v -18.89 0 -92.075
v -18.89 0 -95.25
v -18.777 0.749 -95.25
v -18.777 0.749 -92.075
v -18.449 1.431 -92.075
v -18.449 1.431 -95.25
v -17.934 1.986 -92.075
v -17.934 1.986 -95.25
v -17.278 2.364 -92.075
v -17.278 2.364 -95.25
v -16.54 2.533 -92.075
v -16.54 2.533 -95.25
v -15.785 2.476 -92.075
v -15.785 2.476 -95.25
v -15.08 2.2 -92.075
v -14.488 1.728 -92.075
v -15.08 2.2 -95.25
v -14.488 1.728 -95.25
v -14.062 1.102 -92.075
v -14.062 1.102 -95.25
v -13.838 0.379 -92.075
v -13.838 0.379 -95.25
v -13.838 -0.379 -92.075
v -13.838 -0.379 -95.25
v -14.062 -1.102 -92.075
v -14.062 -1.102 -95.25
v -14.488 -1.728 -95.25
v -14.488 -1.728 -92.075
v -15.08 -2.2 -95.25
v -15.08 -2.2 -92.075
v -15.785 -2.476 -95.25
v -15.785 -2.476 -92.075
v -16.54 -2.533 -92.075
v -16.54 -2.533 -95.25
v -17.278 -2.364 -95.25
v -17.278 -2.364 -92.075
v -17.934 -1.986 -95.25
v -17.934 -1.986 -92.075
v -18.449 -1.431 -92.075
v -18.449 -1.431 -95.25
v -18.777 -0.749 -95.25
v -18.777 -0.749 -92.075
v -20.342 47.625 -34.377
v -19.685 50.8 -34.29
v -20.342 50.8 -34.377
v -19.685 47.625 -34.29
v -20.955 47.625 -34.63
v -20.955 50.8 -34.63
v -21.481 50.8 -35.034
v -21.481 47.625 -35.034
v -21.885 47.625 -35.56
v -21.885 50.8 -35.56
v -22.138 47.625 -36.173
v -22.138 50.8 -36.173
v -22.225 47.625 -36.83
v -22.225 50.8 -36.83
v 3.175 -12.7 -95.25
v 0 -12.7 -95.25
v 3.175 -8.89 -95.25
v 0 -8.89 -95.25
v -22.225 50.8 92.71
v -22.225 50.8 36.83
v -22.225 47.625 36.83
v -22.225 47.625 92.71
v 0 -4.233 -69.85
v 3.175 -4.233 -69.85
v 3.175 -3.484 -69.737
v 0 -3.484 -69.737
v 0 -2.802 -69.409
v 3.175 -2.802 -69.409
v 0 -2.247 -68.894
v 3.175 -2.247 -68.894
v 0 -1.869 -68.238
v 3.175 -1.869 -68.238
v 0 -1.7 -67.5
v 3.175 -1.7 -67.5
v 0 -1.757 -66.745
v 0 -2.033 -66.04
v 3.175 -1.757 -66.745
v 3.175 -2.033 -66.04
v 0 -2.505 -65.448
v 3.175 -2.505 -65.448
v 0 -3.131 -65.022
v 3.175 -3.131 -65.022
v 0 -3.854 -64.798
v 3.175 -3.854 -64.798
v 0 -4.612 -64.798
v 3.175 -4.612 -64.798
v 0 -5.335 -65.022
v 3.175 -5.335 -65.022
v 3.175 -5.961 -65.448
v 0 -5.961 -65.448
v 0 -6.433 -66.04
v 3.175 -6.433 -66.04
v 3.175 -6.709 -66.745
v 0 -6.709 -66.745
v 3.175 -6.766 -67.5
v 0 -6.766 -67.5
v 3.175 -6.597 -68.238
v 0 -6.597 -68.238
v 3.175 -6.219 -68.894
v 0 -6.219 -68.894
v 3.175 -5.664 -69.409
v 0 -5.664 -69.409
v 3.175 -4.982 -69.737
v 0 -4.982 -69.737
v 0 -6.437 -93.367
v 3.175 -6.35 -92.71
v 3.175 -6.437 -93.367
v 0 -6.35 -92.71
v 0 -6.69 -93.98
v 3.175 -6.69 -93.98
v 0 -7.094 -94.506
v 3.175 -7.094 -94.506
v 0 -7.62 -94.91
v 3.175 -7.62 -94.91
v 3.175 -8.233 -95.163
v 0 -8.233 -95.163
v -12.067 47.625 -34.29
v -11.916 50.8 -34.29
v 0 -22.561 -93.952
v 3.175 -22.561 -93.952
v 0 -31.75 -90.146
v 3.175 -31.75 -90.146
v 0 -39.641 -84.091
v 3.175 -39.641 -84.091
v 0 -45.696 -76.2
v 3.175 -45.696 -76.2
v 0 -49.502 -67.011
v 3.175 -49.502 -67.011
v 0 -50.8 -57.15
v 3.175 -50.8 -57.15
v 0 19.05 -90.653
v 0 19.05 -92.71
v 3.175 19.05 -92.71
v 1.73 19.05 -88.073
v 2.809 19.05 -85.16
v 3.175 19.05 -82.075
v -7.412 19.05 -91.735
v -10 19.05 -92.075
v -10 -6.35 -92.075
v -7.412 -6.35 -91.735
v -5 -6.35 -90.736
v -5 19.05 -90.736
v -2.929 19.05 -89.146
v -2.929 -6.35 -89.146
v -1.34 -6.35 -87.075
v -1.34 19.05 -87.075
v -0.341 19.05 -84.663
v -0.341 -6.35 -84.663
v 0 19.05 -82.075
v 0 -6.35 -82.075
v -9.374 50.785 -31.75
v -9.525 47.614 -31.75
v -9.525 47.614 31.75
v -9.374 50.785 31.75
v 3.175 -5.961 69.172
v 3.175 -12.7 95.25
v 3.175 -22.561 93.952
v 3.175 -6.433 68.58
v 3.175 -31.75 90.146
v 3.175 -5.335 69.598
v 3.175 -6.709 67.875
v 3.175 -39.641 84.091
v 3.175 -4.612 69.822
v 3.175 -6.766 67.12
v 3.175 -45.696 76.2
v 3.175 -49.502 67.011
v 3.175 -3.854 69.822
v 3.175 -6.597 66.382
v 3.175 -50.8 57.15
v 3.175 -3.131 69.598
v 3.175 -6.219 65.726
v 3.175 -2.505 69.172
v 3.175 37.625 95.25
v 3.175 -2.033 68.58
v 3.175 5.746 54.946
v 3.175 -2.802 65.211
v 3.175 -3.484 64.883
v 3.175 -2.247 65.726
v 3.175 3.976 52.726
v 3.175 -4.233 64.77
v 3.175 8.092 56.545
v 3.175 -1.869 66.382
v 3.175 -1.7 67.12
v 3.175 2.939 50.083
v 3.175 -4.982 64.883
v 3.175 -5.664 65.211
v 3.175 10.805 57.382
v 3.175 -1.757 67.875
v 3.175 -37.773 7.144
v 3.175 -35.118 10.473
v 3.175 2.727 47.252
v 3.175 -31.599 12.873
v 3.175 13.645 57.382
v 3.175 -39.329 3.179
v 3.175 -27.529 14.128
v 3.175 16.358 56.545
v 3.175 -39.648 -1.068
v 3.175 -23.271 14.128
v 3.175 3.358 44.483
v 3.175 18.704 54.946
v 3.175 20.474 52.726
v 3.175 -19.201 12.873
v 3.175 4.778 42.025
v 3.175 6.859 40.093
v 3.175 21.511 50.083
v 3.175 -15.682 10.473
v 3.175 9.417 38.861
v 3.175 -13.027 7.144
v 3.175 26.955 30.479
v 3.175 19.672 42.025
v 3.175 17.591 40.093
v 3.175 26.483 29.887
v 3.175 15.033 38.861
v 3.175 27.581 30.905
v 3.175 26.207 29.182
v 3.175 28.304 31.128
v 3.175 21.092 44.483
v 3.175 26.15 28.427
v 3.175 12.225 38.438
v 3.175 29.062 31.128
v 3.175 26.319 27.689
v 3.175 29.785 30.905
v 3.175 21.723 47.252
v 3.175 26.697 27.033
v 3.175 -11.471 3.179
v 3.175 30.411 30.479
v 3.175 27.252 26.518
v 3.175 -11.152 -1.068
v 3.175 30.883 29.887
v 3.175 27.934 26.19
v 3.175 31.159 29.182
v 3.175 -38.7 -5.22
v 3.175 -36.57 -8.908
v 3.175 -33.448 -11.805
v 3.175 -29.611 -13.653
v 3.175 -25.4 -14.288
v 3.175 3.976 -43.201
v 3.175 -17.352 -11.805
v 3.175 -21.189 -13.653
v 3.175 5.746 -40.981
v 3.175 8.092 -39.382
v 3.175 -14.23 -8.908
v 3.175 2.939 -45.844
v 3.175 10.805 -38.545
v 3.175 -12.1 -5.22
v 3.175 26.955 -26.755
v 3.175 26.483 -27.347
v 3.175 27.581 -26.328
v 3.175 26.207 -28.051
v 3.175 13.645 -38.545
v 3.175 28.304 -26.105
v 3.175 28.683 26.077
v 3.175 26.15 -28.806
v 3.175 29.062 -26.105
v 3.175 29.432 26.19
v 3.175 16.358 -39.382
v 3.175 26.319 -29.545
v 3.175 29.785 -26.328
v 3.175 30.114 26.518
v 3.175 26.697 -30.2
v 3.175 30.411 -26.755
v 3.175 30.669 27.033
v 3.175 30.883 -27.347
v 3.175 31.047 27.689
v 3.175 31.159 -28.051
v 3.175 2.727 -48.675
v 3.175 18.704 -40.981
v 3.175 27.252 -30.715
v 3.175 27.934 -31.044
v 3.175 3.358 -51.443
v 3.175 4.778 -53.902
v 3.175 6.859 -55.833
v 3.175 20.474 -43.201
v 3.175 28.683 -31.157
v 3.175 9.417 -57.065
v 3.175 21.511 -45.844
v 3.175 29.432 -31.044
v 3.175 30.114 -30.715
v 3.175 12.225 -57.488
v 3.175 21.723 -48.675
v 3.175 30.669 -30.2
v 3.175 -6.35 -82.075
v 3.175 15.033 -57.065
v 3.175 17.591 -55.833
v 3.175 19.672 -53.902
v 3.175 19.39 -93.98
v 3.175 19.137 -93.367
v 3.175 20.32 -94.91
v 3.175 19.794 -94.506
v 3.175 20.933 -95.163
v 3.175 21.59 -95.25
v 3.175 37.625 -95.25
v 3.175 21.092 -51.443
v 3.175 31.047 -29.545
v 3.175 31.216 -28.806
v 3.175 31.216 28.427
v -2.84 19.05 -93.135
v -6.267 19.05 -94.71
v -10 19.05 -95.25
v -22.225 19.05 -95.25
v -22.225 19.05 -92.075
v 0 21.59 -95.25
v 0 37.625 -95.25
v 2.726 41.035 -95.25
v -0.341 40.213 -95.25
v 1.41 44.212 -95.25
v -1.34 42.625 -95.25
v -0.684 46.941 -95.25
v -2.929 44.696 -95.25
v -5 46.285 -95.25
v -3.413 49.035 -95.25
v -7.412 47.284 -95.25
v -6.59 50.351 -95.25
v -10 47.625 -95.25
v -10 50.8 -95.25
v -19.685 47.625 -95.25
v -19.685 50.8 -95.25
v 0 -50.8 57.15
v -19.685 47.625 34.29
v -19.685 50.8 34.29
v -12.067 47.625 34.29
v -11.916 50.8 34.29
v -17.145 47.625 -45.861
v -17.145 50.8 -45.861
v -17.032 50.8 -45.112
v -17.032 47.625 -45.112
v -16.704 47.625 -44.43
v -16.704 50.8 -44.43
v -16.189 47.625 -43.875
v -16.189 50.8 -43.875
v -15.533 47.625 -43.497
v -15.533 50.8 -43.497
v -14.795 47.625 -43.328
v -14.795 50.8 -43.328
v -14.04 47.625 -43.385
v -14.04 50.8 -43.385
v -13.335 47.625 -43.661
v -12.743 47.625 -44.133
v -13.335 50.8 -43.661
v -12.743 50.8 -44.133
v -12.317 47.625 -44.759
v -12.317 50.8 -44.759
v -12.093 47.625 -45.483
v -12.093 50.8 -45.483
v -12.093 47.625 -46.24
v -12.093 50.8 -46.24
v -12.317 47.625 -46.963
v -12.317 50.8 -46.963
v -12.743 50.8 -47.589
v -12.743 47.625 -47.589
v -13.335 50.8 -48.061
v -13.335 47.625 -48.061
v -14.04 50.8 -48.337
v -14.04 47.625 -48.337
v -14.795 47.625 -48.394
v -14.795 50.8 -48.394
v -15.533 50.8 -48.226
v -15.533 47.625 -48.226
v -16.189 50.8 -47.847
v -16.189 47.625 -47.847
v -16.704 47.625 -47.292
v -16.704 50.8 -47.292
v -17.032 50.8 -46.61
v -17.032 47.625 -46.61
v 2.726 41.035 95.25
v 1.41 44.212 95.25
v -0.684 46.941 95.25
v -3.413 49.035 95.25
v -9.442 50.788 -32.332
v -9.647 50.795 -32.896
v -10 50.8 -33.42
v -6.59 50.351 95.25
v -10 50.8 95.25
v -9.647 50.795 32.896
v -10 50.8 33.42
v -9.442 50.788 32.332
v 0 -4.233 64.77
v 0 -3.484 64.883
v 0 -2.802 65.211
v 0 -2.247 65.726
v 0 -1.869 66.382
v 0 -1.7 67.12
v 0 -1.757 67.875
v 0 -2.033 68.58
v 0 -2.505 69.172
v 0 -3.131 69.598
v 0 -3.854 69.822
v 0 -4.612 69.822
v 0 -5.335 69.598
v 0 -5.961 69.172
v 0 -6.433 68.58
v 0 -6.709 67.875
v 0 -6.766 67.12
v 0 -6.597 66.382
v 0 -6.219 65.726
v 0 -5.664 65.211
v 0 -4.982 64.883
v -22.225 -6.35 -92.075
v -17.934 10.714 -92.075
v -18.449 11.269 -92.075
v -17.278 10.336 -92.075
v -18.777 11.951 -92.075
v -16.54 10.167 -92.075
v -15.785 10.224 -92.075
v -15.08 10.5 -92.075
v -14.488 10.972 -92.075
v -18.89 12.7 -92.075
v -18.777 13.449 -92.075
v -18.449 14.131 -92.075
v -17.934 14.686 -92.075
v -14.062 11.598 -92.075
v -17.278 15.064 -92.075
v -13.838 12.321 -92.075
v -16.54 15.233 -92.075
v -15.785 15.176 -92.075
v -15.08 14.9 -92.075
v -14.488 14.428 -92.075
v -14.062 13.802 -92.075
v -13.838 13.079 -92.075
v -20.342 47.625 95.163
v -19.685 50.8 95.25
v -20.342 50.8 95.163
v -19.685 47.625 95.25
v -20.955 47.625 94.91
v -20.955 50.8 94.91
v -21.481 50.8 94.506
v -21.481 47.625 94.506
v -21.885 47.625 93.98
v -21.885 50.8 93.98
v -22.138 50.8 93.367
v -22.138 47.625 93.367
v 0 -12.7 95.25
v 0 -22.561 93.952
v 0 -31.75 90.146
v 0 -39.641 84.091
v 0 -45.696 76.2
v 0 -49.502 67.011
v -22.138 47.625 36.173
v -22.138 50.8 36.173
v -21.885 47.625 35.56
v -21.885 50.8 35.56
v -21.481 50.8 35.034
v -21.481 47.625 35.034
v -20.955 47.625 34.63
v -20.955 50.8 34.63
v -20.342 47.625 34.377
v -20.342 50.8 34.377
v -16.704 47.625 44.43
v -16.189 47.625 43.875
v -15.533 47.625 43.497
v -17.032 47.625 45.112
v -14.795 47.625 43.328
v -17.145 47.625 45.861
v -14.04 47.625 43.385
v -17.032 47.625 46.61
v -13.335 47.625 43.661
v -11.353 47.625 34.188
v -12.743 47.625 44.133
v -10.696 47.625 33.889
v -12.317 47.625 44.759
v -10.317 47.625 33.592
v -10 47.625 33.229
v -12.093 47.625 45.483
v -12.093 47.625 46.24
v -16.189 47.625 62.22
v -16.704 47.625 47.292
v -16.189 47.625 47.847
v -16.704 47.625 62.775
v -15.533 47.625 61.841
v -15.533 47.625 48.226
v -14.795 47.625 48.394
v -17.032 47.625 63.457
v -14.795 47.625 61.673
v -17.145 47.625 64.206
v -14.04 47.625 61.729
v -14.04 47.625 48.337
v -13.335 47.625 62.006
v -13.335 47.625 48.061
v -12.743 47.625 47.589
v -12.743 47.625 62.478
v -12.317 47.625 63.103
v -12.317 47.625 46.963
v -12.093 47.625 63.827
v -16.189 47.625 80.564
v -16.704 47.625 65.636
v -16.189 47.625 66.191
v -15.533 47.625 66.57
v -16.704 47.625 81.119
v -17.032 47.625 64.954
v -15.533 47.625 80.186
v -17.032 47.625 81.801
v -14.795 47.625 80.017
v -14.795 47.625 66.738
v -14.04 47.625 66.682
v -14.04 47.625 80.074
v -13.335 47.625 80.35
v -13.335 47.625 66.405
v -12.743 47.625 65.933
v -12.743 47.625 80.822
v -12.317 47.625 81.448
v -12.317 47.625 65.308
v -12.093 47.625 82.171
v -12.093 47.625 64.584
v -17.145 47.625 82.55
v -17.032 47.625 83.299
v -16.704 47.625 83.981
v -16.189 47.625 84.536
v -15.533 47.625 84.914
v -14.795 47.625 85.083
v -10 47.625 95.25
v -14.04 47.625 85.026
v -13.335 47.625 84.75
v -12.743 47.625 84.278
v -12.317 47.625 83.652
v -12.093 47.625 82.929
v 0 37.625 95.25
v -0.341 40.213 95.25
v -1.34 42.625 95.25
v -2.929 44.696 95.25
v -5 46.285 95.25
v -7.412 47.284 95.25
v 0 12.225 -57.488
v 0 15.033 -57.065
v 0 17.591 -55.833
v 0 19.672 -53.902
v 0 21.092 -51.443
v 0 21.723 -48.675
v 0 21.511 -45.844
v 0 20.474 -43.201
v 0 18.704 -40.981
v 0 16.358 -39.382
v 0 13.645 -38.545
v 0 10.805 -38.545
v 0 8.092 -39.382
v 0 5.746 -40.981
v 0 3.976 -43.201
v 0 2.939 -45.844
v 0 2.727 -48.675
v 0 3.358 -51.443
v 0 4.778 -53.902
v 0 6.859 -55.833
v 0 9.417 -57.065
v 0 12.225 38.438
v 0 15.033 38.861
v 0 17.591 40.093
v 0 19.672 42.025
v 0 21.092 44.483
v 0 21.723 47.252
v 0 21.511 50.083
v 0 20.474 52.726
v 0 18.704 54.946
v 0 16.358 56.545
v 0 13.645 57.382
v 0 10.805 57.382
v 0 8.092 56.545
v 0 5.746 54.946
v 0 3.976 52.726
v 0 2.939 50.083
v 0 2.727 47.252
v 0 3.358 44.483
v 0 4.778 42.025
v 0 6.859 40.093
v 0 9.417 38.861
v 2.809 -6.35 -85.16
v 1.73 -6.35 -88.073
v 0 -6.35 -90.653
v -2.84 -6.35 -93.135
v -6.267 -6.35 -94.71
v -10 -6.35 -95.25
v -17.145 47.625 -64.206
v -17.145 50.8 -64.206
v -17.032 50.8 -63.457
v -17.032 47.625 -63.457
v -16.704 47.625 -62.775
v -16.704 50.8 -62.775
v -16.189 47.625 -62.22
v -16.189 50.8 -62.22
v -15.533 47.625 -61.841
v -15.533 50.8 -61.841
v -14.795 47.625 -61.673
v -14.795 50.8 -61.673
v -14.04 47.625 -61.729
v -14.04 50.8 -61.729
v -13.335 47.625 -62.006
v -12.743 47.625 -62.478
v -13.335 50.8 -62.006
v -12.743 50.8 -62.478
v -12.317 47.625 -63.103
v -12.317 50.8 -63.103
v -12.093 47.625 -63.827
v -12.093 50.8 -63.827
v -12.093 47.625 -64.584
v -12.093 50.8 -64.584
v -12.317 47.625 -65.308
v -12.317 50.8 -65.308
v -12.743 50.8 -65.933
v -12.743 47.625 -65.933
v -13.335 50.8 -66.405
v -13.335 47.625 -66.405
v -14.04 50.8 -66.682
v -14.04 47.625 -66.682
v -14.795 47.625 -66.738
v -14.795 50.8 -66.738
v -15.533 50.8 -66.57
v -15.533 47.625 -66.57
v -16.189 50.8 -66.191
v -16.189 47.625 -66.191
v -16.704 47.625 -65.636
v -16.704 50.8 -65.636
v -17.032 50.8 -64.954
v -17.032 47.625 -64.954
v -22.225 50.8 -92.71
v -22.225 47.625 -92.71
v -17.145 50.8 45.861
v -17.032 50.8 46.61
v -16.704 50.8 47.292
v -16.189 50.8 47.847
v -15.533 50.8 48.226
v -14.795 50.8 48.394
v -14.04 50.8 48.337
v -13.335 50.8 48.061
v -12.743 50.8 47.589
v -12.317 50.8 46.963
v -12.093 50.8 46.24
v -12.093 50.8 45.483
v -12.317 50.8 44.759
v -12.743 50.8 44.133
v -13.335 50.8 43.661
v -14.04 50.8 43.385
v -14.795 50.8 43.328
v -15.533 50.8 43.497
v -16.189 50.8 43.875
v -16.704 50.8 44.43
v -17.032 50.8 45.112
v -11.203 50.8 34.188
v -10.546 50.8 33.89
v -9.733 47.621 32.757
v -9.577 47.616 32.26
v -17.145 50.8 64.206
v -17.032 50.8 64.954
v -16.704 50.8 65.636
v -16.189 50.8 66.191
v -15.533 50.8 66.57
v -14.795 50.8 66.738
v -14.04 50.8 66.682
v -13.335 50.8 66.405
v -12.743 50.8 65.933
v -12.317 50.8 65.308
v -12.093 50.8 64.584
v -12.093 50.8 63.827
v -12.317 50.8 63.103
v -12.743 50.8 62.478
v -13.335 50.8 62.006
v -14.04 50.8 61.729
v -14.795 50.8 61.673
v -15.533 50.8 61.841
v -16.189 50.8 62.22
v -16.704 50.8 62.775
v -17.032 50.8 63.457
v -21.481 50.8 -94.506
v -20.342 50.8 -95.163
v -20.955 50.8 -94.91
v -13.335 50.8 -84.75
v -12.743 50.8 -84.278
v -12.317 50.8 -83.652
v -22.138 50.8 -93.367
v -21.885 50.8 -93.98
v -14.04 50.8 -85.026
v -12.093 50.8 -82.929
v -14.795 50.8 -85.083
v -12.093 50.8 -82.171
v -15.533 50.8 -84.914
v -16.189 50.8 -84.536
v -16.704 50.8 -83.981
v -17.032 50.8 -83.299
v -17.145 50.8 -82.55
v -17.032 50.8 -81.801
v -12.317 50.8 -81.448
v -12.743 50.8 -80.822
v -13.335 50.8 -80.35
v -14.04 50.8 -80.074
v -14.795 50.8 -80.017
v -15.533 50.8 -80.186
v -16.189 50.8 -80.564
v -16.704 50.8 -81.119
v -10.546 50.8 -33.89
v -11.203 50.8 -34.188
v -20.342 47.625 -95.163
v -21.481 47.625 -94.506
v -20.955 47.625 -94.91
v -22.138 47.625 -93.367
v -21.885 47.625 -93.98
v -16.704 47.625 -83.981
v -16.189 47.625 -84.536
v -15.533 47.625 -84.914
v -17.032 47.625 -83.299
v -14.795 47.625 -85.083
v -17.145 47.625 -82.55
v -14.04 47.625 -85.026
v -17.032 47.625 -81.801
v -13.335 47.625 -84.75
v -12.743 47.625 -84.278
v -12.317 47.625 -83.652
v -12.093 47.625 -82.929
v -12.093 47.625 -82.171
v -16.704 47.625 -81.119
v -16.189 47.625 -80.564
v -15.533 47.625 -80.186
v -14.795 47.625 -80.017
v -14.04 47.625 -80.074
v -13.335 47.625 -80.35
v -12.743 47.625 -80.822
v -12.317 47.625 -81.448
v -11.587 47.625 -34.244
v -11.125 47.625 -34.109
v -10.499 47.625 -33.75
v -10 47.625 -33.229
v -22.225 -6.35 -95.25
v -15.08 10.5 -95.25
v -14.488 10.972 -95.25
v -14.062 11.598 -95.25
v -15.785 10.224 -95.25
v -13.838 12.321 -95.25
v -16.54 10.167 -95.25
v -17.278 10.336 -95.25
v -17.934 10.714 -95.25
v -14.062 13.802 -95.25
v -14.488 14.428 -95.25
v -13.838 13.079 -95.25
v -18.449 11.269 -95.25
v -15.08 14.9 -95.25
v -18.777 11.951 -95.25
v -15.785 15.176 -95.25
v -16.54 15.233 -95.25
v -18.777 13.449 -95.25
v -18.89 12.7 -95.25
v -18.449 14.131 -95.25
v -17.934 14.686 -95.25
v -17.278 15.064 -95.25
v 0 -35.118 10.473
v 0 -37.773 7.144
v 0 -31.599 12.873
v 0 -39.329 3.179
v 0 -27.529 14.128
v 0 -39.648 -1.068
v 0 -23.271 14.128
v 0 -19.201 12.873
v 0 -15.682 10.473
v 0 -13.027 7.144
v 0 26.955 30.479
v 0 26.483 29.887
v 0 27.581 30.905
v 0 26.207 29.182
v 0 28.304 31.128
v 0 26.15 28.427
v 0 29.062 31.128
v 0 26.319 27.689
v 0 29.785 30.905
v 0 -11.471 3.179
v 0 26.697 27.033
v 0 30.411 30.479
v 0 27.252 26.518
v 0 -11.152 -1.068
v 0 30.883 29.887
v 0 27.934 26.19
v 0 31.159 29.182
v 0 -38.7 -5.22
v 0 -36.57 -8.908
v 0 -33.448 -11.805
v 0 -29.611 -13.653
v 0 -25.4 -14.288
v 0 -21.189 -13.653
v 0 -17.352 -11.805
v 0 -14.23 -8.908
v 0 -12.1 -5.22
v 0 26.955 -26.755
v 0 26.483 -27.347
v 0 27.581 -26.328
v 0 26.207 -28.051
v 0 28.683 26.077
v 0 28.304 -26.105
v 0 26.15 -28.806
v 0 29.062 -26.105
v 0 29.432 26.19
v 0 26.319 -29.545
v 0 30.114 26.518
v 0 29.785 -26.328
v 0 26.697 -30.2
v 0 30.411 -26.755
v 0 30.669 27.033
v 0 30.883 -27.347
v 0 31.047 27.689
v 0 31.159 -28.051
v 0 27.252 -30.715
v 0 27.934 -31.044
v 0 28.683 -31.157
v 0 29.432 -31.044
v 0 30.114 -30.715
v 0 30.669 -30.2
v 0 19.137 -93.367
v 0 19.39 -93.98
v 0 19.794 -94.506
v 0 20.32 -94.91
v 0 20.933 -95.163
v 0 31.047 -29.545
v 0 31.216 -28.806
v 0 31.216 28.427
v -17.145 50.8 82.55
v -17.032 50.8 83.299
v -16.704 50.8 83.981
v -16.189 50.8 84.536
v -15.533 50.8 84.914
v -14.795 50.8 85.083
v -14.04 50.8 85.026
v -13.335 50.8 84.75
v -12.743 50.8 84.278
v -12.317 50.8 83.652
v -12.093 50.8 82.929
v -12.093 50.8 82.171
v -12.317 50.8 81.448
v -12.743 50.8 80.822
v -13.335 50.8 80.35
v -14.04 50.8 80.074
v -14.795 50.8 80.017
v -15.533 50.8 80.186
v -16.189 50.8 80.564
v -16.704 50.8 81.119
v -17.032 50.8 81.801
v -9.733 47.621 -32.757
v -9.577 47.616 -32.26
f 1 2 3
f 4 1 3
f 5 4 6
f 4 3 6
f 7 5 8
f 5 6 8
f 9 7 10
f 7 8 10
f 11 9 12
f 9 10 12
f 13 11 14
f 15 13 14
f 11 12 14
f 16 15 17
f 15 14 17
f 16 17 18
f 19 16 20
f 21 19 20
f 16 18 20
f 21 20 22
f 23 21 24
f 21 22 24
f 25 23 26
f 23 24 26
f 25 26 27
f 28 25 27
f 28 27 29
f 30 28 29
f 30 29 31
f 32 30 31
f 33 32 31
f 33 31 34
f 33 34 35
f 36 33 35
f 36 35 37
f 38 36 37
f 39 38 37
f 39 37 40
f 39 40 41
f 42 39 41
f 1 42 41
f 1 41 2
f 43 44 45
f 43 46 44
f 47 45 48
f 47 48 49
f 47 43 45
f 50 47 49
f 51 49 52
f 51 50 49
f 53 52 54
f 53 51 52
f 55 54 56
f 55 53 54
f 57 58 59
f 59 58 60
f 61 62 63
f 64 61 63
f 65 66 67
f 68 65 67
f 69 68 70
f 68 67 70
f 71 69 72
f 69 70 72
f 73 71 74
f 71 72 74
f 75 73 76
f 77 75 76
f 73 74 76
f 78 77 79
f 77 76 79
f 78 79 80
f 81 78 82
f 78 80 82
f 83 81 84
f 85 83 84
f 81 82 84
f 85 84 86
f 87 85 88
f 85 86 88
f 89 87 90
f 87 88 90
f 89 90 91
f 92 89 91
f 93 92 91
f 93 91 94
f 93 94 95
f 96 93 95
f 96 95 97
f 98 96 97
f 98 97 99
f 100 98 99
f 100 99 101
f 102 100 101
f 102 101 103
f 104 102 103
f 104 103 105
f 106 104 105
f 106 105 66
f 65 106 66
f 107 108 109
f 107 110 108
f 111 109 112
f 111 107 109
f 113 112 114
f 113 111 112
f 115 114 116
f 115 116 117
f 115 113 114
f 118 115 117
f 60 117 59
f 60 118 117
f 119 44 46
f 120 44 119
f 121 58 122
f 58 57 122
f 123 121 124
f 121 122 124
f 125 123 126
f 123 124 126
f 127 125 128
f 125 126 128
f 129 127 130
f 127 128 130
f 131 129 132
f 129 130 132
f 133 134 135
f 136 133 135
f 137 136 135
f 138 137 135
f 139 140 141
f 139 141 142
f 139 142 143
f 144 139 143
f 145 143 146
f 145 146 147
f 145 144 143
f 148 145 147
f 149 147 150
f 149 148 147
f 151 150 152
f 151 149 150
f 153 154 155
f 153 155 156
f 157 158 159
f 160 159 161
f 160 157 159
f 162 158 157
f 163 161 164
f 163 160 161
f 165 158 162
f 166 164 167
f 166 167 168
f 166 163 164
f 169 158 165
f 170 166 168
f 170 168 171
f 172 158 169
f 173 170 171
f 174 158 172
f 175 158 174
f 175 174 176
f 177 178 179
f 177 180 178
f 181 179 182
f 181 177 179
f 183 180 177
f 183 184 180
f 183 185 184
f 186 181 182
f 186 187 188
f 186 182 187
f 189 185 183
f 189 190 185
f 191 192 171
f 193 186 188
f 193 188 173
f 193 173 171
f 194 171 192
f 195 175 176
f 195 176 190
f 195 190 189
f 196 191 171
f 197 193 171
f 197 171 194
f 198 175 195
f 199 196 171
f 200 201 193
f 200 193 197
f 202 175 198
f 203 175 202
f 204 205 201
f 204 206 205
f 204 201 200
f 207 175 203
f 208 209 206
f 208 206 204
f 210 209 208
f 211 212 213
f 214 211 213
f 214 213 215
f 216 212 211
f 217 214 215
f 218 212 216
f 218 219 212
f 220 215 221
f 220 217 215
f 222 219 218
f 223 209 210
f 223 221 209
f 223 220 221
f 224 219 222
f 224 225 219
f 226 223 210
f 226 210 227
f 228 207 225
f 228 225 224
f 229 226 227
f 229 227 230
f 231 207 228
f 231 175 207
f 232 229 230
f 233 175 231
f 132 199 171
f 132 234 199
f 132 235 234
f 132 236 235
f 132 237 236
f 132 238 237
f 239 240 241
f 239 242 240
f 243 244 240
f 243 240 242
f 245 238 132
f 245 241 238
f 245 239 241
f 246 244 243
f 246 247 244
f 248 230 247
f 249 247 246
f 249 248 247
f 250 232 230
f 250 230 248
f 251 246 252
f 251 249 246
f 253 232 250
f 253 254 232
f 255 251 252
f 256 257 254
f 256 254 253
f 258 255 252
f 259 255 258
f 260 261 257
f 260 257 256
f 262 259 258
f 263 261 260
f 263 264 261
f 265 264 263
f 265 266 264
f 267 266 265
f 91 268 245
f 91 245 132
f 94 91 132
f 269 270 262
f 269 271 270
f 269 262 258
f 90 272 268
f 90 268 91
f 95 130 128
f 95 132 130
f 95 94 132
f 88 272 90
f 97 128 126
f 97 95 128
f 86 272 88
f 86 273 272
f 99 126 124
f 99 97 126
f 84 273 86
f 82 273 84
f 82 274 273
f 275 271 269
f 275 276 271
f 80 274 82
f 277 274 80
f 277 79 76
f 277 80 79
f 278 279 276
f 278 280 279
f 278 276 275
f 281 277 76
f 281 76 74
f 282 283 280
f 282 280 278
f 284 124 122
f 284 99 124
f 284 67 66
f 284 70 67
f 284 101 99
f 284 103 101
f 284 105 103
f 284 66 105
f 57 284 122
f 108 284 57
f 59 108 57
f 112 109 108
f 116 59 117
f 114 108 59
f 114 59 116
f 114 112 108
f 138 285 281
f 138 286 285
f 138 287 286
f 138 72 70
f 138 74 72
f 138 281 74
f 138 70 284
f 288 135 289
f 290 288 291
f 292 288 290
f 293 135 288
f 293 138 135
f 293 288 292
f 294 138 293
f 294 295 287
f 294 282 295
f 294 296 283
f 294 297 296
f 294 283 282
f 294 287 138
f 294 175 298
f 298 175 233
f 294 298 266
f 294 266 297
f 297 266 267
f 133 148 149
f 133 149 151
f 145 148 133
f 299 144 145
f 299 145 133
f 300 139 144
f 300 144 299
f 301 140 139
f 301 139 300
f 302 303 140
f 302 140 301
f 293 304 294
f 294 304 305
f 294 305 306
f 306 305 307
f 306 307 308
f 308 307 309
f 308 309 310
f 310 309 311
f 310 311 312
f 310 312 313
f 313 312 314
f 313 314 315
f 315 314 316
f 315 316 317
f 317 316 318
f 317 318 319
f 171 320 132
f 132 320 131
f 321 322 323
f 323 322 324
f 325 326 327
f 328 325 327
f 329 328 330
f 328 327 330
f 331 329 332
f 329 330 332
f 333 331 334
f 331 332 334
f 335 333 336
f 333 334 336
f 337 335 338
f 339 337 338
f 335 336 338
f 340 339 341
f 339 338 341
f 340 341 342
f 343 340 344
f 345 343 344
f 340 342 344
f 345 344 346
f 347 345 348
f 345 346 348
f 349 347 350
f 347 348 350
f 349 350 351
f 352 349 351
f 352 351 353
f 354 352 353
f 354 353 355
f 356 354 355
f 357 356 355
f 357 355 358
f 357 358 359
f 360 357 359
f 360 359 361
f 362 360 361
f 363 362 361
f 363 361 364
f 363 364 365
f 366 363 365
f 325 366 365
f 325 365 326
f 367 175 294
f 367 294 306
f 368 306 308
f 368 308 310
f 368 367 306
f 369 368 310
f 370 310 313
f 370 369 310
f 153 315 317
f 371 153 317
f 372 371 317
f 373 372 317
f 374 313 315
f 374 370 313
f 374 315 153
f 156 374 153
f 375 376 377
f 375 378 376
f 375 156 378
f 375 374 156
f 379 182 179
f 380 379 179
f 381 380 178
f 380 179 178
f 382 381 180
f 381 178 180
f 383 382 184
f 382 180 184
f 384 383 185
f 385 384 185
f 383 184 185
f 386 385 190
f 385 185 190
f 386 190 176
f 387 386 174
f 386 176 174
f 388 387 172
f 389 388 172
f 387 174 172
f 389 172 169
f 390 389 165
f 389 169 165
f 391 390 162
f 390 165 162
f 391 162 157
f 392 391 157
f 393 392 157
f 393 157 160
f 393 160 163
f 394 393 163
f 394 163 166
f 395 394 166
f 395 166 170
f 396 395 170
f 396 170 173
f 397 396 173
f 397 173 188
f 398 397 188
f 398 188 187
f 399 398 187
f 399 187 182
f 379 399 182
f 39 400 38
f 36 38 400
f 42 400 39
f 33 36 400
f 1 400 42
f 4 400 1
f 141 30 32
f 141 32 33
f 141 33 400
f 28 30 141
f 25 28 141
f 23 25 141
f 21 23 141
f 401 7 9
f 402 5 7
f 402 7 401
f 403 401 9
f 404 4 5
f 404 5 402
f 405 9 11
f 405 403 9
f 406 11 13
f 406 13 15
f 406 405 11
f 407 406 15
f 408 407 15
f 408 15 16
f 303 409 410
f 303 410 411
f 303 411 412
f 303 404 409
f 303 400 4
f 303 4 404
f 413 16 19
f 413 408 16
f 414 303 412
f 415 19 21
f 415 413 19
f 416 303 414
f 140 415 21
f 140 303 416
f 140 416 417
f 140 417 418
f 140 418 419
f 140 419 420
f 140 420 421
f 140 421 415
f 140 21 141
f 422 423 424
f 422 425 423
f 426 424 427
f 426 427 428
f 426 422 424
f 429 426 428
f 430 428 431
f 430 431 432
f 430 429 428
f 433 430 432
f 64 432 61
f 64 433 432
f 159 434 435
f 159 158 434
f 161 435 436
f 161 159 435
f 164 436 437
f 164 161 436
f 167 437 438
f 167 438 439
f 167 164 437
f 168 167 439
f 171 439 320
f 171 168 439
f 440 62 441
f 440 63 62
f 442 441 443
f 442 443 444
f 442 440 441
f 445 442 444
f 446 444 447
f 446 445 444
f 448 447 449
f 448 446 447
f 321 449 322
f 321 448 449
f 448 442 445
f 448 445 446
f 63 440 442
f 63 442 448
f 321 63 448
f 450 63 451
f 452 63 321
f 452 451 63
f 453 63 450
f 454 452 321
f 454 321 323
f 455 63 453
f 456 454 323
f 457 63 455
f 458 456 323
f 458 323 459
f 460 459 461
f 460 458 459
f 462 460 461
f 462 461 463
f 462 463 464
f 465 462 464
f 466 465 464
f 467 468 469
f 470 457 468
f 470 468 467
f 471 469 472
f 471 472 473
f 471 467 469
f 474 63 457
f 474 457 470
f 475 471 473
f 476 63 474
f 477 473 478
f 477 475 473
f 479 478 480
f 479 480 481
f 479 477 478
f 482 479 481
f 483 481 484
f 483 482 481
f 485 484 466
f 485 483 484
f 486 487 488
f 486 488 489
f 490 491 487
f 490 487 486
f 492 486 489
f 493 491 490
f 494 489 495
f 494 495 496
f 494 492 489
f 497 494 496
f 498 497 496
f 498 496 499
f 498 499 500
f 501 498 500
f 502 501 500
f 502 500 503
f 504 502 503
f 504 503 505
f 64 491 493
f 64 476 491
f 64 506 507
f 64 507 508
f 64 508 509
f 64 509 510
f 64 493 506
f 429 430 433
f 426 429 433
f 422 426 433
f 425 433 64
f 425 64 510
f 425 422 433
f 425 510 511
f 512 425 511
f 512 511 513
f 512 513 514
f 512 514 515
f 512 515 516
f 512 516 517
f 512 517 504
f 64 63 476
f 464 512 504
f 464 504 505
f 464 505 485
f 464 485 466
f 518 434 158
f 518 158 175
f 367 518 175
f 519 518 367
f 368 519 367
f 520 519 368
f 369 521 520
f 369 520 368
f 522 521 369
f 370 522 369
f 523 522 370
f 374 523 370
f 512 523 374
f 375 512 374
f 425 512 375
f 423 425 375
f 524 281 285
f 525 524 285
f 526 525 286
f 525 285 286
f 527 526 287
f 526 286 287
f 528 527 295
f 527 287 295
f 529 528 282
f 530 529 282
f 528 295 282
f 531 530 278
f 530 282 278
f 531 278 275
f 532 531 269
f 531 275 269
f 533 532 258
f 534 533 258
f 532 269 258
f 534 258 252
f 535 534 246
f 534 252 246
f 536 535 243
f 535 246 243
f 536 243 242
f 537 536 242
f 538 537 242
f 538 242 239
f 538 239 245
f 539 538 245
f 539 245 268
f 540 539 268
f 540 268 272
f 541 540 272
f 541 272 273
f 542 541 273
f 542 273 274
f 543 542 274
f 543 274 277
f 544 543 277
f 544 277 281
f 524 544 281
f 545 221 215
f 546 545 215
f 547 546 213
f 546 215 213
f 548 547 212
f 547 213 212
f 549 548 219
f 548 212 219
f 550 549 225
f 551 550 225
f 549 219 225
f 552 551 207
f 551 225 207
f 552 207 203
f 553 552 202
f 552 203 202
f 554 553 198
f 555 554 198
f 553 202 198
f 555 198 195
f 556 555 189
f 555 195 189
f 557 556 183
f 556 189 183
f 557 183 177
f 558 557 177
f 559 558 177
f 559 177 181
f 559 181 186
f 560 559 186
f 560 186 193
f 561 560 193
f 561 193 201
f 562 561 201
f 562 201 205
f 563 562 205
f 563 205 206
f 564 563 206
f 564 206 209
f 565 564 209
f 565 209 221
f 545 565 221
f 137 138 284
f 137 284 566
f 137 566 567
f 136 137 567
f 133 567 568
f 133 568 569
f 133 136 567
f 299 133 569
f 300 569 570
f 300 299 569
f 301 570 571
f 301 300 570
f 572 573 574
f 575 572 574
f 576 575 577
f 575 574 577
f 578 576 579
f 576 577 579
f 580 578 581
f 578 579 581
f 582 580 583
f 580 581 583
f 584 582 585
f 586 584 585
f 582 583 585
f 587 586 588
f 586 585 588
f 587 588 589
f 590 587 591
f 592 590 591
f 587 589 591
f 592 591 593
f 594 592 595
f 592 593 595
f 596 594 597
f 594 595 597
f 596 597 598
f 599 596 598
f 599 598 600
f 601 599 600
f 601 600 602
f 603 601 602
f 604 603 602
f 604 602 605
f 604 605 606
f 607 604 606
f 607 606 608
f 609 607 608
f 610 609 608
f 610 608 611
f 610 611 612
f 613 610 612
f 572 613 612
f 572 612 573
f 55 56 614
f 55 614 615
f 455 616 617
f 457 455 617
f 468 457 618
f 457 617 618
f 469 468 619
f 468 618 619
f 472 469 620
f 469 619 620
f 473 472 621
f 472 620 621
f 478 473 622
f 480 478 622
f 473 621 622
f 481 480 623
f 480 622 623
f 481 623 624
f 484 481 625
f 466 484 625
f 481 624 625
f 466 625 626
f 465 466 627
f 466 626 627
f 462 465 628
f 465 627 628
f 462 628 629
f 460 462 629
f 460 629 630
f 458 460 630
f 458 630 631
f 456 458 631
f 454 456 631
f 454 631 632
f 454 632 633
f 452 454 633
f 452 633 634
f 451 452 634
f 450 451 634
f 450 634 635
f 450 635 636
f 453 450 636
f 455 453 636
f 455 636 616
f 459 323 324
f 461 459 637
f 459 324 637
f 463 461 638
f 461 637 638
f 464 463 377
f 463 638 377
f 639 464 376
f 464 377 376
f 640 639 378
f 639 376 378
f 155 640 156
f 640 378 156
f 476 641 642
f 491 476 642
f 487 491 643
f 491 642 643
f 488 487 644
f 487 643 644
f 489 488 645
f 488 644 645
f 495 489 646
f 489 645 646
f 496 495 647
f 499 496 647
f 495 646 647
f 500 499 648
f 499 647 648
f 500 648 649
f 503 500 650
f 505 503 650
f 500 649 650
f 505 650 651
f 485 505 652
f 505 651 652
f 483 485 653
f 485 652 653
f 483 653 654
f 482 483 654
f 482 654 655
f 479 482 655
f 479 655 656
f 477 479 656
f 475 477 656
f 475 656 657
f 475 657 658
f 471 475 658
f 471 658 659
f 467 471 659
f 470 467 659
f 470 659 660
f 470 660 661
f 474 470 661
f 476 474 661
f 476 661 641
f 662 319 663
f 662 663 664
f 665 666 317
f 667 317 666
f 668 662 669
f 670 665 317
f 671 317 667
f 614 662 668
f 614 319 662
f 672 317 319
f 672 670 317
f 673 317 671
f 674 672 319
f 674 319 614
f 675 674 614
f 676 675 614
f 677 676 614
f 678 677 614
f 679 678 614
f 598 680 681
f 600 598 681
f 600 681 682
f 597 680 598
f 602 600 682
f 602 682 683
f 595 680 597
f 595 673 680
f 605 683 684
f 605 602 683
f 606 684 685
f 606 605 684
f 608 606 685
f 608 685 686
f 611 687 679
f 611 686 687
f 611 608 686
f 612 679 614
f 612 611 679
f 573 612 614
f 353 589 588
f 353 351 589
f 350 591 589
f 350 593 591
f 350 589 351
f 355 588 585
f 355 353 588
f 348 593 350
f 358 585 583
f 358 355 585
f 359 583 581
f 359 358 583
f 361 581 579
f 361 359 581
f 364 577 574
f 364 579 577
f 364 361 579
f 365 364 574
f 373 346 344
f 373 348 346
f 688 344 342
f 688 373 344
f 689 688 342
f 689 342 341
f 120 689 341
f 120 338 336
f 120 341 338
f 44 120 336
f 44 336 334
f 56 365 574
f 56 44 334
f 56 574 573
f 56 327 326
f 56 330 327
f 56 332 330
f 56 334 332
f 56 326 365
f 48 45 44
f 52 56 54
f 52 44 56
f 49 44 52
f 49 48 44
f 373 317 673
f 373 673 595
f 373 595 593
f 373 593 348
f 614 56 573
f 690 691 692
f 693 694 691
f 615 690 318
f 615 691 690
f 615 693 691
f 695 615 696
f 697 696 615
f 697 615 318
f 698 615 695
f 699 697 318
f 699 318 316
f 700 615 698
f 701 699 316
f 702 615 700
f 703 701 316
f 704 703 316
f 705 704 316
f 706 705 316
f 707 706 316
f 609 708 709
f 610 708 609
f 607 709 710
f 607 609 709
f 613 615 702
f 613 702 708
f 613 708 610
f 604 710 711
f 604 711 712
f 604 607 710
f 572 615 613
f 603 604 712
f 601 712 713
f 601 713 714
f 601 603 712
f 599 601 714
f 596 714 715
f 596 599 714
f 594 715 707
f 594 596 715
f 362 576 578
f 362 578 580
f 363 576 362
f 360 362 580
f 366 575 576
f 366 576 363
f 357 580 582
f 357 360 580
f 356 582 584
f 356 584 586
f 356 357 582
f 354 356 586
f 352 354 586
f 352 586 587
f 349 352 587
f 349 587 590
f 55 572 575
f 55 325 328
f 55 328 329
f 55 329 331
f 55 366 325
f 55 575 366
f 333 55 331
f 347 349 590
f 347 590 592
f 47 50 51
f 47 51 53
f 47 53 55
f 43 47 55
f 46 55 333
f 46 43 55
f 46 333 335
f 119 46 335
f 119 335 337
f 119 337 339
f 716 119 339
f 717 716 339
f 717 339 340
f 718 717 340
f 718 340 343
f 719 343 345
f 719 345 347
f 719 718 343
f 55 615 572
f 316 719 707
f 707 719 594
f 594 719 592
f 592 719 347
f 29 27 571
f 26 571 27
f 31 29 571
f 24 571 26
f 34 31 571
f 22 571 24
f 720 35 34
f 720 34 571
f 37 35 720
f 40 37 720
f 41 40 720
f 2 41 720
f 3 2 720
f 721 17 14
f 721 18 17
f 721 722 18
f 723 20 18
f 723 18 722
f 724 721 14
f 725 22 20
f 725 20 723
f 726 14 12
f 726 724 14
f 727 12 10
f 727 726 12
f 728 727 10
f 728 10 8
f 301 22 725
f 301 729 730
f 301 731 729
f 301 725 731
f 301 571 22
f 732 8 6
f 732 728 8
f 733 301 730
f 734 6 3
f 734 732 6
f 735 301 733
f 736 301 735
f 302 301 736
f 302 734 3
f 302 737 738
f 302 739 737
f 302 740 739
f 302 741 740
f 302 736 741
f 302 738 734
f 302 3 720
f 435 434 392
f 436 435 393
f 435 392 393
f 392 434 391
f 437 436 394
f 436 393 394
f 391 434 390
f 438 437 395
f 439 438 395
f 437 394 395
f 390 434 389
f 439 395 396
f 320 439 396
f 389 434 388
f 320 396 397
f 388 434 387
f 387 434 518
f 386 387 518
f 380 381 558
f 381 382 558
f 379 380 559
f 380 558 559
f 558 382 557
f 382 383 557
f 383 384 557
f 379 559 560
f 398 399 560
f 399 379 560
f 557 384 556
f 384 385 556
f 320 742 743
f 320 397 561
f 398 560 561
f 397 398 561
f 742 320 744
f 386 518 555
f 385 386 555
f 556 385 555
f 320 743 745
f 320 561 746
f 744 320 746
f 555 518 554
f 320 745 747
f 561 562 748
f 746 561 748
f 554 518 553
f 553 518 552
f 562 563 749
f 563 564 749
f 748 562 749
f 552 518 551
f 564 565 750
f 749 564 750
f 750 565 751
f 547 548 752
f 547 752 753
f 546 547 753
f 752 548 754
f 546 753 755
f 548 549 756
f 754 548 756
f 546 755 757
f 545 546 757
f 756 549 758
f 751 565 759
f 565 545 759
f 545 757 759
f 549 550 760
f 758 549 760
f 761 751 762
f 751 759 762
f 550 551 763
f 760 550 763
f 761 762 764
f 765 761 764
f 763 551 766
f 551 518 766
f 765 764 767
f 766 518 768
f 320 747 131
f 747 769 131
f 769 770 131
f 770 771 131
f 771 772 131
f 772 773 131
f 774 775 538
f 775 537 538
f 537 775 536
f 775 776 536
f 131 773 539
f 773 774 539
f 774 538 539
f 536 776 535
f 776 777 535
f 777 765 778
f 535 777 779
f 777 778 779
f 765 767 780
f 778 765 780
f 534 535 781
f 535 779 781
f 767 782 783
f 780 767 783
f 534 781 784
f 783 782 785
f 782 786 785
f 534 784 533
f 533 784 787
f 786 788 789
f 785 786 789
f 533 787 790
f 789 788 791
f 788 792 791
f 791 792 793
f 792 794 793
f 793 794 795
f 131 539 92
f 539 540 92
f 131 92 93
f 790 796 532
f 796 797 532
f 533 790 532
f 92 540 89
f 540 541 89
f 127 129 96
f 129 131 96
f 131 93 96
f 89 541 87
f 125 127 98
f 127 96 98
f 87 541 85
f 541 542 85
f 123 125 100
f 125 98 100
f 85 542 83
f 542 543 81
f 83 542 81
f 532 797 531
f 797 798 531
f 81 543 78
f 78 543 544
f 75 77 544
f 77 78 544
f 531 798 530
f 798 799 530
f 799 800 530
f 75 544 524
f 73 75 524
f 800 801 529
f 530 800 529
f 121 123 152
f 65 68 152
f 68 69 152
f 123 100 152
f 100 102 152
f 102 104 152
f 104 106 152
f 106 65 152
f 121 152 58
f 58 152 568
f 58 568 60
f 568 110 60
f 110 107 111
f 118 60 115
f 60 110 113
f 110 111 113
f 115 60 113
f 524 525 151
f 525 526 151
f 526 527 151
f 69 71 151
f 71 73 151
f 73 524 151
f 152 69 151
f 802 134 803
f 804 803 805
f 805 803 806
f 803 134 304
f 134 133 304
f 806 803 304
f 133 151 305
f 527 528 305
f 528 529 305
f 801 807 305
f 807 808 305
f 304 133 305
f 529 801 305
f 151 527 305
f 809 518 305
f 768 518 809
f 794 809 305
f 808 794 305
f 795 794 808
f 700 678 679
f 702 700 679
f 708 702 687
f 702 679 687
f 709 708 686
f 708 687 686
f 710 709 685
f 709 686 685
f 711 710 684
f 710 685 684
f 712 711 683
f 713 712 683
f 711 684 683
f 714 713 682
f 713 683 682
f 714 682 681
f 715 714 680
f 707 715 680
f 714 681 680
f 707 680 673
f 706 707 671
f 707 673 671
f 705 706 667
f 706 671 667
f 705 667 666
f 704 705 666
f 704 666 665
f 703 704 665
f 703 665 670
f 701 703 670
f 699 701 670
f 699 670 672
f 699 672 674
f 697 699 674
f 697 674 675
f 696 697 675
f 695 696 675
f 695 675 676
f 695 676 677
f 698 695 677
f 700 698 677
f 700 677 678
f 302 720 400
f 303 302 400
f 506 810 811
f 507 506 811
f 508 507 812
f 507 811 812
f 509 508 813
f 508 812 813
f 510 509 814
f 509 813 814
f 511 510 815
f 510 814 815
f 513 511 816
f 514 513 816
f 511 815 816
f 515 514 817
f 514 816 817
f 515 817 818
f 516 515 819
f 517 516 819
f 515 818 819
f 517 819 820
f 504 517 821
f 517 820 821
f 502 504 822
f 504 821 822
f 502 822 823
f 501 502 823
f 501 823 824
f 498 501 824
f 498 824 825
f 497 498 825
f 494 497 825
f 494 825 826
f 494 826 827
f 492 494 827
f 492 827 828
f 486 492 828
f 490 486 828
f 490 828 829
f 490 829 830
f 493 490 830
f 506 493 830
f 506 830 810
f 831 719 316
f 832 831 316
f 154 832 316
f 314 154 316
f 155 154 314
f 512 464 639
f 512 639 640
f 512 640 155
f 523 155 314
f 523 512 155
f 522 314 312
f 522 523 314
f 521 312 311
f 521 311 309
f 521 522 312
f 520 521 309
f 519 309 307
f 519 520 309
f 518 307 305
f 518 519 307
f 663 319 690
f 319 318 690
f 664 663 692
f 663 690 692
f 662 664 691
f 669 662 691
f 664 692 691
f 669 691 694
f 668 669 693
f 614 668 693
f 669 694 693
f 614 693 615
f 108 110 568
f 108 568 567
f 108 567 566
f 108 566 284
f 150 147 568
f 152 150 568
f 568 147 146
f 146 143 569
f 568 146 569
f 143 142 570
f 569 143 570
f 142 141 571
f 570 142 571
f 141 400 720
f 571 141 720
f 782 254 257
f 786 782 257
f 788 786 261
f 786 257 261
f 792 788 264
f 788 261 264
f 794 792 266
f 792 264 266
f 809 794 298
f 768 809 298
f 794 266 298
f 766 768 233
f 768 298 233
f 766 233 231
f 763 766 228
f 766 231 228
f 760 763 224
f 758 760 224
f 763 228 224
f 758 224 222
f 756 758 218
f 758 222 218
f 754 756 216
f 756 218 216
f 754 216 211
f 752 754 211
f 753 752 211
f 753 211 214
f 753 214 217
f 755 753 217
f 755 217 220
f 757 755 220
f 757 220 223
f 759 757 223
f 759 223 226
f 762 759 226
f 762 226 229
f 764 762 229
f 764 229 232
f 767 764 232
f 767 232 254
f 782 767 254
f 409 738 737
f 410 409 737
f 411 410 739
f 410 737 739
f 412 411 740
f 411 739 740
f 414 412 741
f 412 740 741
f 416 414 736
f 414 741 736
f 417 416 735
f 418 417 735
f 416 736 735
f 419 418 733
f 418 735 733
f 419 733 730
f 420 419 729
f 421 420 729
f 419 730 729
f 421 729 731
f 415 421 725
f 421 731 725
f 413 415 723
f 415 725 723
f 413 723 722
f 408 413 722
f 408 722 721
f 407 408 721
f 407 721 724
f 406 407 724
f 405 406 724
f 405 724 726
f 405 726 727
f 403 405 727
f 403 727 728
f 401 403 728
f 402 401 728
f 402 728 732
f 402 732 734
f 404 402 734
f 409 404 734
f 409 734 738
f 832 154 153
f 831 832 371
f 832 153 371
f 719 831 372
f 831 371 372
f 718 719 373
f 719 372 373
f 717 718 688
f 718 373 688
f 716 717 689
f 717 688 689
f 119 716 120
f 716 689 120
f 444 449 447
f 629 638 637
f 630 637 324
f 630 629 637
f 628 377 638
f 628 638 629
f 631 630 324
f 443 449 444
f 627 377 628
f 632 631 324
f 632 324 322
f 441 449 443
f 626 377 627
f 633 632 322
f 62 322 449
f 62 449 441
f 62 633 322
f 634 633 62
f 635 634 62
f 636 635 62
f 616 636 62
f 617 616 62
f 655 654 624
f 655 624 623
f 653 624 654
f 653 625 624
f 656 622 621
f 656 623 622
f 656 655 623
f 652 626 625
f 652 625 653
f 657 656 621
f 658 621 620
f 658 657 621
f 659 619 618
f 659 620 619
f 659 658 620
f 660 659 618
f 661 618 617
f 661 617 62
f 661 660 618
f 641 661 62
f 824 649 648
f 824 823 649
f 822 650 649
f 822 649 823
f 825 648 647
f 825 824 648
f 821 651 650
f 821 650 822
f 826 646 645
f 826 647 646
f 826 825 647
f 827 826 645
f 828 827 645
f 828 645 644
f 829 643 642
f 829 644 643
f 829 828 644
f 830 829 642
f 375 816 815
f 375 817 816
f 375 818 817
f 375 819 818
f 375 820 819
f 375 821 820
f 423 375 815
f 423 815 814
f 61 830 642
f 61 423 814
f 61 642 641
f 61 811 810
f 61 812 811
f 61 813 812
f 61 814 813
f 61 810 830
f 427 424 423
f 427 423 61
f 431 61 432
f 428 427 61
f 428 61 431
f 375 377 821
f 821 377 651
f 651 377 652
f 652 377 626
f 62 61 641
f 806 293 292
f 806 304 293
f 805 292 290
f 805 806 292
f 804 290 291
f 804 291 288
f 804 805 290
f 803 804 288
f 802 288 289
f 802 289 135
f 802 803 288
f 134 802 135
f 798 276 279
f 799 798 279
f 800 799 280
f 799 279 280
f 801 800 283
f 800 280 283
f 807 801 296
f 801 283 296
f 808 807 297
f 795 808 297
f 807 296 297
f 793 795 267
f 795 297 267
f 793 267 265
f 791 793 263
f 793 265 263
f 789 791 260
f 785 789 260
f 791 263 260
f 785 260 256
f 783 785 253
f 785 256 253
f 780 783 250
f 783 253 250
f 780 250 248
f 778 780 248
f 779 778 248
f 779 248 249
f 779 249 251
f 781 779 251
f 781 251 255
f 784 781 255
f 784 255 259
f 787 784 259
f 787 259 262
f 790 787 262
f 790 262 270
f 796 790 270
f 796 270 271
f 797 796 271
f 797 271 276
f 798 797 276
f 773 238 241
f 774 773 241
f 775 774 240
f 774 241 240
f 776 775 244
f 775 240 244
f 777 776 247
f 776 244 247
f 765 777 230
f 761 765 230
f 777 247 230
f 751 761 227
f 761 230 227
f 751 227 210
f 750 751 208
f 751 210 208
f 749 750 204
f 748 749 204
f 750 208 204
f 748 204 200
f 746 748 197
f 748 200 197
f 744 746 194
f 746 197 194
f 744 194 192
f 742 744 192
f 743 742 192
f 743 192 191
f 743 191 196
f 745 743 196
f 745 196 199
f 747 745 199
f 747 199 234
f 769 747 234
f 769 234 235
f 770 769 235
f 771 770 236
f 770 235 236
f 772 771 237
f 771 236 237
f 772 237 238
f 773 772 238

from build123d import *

# Parameters (mm, degrees)
SKETCH1_W                    = 190.5
SKETCH1_H                    = 101.6
BOSS_EXTRUDE1_DEPTH          = 3.175
SKETCH2_R                    = 14.2875
CUT_EXTRUDE1_DEPTH           = 3.175
EDGE_FLANGE1_STRIP_W         = 32.7
EDGE_FLANGE1_STRIP_H         = 3.175
EDGE_FLANGE1_STRIP_CUT_DEPTH = 190.5
EDGE_FLANGE1_DEPTH           = 190.5
SKETCH12_R                   = 9.525
SKETCH12_R_2                 = 2.54
CUT_EXTRUDE2_DEPTH           = 7.62
FILLET1_R                    = 38.1
SKETCH13_W                   = 3.175
SKETCH13_H                   = 25.4
BOSS_EXTRUDE2_DEPTH          = 0.000254
EDGE_FLANGE2_STRIP_W         = 32.7
EDGE_FLANGE2_STRIP_H         = 3.175
EDGE_FLANGE2_STRIP_CUT_DEPTH = 25.4
EDGE_FLANGE2_DEPTH           = 25.4
SKETCH17_R                   = 2.54
CUT_EXTRUDE3_DEPTH           = 142.028796748
SKETCH18_R                   = 2.54
CUT_EXTRUDE4_DEPTH           = 199.405991339
CUT_EXTRUDE5_START           = -34.29
CUT_EXTRUDE5_DEPTH           = 68.58
FILLET3_R                    = 2.54
FILLET4_R                    = 2.54


# Read off the part's stored shape, not the designer's step: Cut-Extrude5
# Sheet-metal steps are written as plain solids
with BuildPart() as part:
    # Sketch1 → Boss-Extrude1 (new body)
    with BuildSketch(Plane(origin=(0, 0, 0), x_dir=(0, 0, -1), z_dir=(1, 0, 0))):
        Rectangle(SKETCH1_W, SKETCH1_H)
    extrude(amount=BOSS_EXTRUDE1_DEPTH)

    # Sketch2 → Cut-Extrude1 (cut)
    with BuildSketch(Plane(origin=(3.175, 0, 0), x_dir=(0, 0, -1), z_dir=(1, 0, 0))):
        with Locations((0, -25.4)):
            Circle(SKETCH2_R)
    extrude(amount=-CUT_EXTRUDE1_DEPTH, mode=Mode.SUBTRACT)

    # Edge-Flange1 strip (across the edge) → Edge-Flange1 strip cut (cut)
    with BuildSketch(Plane(origin=(0, 50.8, 95.25), x_dir=(0, -1, 0), z_dir=(0, 0, -1))):
        with Locations((-3.175, -1.5875)):
            Rectangle(EDGE_FLANGE1_STRIP_W, EDGE_FLANGE1_STRIP_H)
    extrude(amount=EDGE_FLANGE1_STRIP_CUT_DEPTH, mode=Mode.SUBTRACT)

    # Edge-Flange1 section (across the edge) → Edge-Flange1 (add)
    with BuildSketch(Plane(origin=(0, 50.8, 95.25), x_dir=(0, -1, 0), z_dir=(0, 0, -1))):
        with BuildLine():
            Line((0, 10), (0, 22.225))
            Line((0, 22.225), (3.175, 22.225))
            Line((3.175, 22.225), (3.175, 10))
            ThreePointArc((3.175, 10), (6.103932188, 2.928932188), (13.175, 0))
            Line((13.175, 0), (13.175, -3.175))
            ThreePointArc((13.175, -3.175), (3.858868158, 0.683868158), (0, 10))
        make_face()
    extrude(amount=EDGE_FLANGE1_DEPTH)

    # Sketch12 → Cut-Extrude2 (cut)
    with BuildSketch(Plane(origin=(3.175, 0, 0), x_dir=(0, 0, -1), z_dir=(1, 0, 0))):
        with Locations((-47.963329482, 12.225)):
            Circle(SKETCH12_R)
        with Locations((-28.616658964, 28.683017495)):
            Circle(SKETCH12_R_2)
        with Locations((-67.31, -4.233017495)):
            Circle(SKETCH12_R_2)
        with Locations((47.963329482, 12.225)):
            Circle(SKETCH12_R)
        with Locations((28.616658964, 28.683017495)):
            Circle(SKETCH12_R_2)
        with Locations((67.31, -4.233017495)):
            Circle(SKETCH12_R_2)
    extrude(amount=-CUT_EXTRUDE2_DEPTH, mode=Mode.SUBTRACT)

    # Fillet1
    fillet1_edges = [part.edges().sort_by_distance(p)[0] for p in [
        (1.5875, -50.8, 95.25),
        (1.5875, -50.8, -95.25),
    ]]
    fillet(fillet1_edges, radius=FILLET1_R)

    # Sketch13 → Boss-Extrude2 (add)
    with BuildSketch(Plane(origin=(0, 0, -95.25), x_dir=(-1, 0, 0), z_dir=(0, 0, -1))):
        with Locations((-1.5875, 6.35)):
            Rectangle(SKETCH13_W, SKETCH13_H)
    extrude(amount=BOSS_EXTRUDE2_DEPTH)

    # Edge-Flange2 strip (across the edge) → Edge-Flange2 strip cut (cut)
    with BuildSketch(Plane(origin=(0, 19.05, -95.250254), x_dir=(0, 0, 1), z_dir=(0, -1, 0))):
        with Locations((-3.175, -1.5875)):
            Rectangle(EDGE_FLANGE2_STRIP_W, EDGE_FLANGE2_STRIP_H)
    extrude(amount=EDGE_FLANGE2_STRIP_CUT_DEPTH, mode=Mode.SUBTRACT)

    # Edge-Flange2 section (across the edge) → Edge-Flange2 (add)
    with BuildSketch(Plane(origin=(0, 19.05, -95.250254), x_dir=(0, 0, 1), z_dir=(0, -1, 0))):
        with BuildLine():
            Line((0, 10), (0, 22.225))
            Line((0, 22.225), (3.175, 22.225))
            Line((3.175, 22.225), (3.175, 10))
            ThreePointArc((3.175, 10), (6.103932188, 2.928932188), (13.175, 0))
            Line((13.175, 0), (13.175, -3.175))
            ThreePointArc((13.175, -3.175), (3.858868158, 0.683868158), (0, 10))
        make_face()
    extrude(amount=EDGE_FLANGE2_DEPTH)

    # Sketch17 → Cut-Extrude3 (cut, through all)
    with BuildSketch(Plane(origin=(0, 50.8, 0), x_dir=(1, 0, 0), z_dir=(0, 1, 0))):
        with Locations(Location((-14.605, 82.55, 0), (0, 0, 180))):
            Circle(SKETCH17_R)
        with Locations(Location((-14.605, 64.205555556, 0), (0, 0, 180))):
            Circle(SKETCH17_R)
        with Locations(Location((-14.605, 45.861111111, 0), (0, 0, 180))):
            Circle(SKETCH17_R)
        with Locations(Location((-14.605, 27.516666667, 0), (0, 0, 180))):
            Circle(SKETCH17_R)
        with Locations(Location((-14.605, 9.172222222, 0), (0, 0, 180))):
            Circle(SKETCH17_R)
        with Locations(Location((-14.605, -9.172222222, 0), (0, 0, 180))):
            Circle(SKETCH17_R)
        with Locations(Location((-14.605, -27.516666667, 0), (0, 0, 180))):
            Circle(SKETCH17_R)
        with Locations(Location((-14.605, -45.861111111, 0), (0, 0, 180))):
            Circle(SKETCH17_R)
        with Locations(Location((-14.605, -64.205555556, 0), (0, 0, 180))):
            Circle(SKETCH17_R)
        with Locations(Location((-14.605, -82.55, 0), (0, 0, 180))):
            Circle(SKETCH17_R)
    extrude(amount=-CUT_EXTRUDE3_DEPTH, mode=Mode.SUBTRACT)

    # Sketch18 → Cut-Extrude4 (cut, through all)
    with BuildSketch(Plane(origin=(0, 0, -95.250254), x_dir=(-1, 0, 0), z_dir=(0, 0, -1))):
        with Locations((16.35, 12.7)):
            Circle(SKETCH18_R)
        with Locations((16.35, 0)):
            Circle(SKETCH18_R)
    extrude(amount=-CUT_EXTRUDE4_DEPTH, mode=Mode.SUBTRACT)

    # Cut-Extrude5 outline → Cut-Extrude5 (cut)
    with BuildSketch(Plane.XY.offset(CUT_EXTRUDE5_START)):
        with BuildLine():
            ThreePointArc((-10, 47.625), (-9.762432951, 47.622177697), (-9.525, 47.61371238))
            Line((-9.525, 47.61371238), (-9.3741875, 50.78512856))
            ThreePointArc((-9.3741875, 50.78512856), (-9.687005413, 50.796281615), (-10, 50.8))
            Line((-10, 50.8), (-22.225, 50.8))
            Line((-22.225, 50.8), (-22.225, 47.625))
            Line((-22.225, 47.625), (-10, 47.625))
        make_face()
    extrude(amount=CUT_EXTRUDE5_DEPTH, mode=Mode.SUBTRACT)

    # Fillet3
    fillet3_edges = [part.edges().sort_by_distance(p)[0] for p in [
        (-22.225, 49.2125, 95.25),
        (-22.225, 49.2125, 34.29),
        (-9.44959375, 49.19942047, 34.29),
        (-9.44959375, 49.19942047, -34.29),
        (-22.225, 49.2125, -34.29),
        (-22.225, 49.2125, -95.25),
    ]]
    fillet(fillet3_edges, radius=FILLET3_R)

    # Fillet4
    fillet4_edges = [part.edges().sort_by_distance(p)[0] for p in [
        (1.5875, -6.35, -95.25),
        (1.5875, 19.05, -95.25),
    ]]
    fillet(fillet4_edges, radius=FILLET4_R)


solid = part.part
